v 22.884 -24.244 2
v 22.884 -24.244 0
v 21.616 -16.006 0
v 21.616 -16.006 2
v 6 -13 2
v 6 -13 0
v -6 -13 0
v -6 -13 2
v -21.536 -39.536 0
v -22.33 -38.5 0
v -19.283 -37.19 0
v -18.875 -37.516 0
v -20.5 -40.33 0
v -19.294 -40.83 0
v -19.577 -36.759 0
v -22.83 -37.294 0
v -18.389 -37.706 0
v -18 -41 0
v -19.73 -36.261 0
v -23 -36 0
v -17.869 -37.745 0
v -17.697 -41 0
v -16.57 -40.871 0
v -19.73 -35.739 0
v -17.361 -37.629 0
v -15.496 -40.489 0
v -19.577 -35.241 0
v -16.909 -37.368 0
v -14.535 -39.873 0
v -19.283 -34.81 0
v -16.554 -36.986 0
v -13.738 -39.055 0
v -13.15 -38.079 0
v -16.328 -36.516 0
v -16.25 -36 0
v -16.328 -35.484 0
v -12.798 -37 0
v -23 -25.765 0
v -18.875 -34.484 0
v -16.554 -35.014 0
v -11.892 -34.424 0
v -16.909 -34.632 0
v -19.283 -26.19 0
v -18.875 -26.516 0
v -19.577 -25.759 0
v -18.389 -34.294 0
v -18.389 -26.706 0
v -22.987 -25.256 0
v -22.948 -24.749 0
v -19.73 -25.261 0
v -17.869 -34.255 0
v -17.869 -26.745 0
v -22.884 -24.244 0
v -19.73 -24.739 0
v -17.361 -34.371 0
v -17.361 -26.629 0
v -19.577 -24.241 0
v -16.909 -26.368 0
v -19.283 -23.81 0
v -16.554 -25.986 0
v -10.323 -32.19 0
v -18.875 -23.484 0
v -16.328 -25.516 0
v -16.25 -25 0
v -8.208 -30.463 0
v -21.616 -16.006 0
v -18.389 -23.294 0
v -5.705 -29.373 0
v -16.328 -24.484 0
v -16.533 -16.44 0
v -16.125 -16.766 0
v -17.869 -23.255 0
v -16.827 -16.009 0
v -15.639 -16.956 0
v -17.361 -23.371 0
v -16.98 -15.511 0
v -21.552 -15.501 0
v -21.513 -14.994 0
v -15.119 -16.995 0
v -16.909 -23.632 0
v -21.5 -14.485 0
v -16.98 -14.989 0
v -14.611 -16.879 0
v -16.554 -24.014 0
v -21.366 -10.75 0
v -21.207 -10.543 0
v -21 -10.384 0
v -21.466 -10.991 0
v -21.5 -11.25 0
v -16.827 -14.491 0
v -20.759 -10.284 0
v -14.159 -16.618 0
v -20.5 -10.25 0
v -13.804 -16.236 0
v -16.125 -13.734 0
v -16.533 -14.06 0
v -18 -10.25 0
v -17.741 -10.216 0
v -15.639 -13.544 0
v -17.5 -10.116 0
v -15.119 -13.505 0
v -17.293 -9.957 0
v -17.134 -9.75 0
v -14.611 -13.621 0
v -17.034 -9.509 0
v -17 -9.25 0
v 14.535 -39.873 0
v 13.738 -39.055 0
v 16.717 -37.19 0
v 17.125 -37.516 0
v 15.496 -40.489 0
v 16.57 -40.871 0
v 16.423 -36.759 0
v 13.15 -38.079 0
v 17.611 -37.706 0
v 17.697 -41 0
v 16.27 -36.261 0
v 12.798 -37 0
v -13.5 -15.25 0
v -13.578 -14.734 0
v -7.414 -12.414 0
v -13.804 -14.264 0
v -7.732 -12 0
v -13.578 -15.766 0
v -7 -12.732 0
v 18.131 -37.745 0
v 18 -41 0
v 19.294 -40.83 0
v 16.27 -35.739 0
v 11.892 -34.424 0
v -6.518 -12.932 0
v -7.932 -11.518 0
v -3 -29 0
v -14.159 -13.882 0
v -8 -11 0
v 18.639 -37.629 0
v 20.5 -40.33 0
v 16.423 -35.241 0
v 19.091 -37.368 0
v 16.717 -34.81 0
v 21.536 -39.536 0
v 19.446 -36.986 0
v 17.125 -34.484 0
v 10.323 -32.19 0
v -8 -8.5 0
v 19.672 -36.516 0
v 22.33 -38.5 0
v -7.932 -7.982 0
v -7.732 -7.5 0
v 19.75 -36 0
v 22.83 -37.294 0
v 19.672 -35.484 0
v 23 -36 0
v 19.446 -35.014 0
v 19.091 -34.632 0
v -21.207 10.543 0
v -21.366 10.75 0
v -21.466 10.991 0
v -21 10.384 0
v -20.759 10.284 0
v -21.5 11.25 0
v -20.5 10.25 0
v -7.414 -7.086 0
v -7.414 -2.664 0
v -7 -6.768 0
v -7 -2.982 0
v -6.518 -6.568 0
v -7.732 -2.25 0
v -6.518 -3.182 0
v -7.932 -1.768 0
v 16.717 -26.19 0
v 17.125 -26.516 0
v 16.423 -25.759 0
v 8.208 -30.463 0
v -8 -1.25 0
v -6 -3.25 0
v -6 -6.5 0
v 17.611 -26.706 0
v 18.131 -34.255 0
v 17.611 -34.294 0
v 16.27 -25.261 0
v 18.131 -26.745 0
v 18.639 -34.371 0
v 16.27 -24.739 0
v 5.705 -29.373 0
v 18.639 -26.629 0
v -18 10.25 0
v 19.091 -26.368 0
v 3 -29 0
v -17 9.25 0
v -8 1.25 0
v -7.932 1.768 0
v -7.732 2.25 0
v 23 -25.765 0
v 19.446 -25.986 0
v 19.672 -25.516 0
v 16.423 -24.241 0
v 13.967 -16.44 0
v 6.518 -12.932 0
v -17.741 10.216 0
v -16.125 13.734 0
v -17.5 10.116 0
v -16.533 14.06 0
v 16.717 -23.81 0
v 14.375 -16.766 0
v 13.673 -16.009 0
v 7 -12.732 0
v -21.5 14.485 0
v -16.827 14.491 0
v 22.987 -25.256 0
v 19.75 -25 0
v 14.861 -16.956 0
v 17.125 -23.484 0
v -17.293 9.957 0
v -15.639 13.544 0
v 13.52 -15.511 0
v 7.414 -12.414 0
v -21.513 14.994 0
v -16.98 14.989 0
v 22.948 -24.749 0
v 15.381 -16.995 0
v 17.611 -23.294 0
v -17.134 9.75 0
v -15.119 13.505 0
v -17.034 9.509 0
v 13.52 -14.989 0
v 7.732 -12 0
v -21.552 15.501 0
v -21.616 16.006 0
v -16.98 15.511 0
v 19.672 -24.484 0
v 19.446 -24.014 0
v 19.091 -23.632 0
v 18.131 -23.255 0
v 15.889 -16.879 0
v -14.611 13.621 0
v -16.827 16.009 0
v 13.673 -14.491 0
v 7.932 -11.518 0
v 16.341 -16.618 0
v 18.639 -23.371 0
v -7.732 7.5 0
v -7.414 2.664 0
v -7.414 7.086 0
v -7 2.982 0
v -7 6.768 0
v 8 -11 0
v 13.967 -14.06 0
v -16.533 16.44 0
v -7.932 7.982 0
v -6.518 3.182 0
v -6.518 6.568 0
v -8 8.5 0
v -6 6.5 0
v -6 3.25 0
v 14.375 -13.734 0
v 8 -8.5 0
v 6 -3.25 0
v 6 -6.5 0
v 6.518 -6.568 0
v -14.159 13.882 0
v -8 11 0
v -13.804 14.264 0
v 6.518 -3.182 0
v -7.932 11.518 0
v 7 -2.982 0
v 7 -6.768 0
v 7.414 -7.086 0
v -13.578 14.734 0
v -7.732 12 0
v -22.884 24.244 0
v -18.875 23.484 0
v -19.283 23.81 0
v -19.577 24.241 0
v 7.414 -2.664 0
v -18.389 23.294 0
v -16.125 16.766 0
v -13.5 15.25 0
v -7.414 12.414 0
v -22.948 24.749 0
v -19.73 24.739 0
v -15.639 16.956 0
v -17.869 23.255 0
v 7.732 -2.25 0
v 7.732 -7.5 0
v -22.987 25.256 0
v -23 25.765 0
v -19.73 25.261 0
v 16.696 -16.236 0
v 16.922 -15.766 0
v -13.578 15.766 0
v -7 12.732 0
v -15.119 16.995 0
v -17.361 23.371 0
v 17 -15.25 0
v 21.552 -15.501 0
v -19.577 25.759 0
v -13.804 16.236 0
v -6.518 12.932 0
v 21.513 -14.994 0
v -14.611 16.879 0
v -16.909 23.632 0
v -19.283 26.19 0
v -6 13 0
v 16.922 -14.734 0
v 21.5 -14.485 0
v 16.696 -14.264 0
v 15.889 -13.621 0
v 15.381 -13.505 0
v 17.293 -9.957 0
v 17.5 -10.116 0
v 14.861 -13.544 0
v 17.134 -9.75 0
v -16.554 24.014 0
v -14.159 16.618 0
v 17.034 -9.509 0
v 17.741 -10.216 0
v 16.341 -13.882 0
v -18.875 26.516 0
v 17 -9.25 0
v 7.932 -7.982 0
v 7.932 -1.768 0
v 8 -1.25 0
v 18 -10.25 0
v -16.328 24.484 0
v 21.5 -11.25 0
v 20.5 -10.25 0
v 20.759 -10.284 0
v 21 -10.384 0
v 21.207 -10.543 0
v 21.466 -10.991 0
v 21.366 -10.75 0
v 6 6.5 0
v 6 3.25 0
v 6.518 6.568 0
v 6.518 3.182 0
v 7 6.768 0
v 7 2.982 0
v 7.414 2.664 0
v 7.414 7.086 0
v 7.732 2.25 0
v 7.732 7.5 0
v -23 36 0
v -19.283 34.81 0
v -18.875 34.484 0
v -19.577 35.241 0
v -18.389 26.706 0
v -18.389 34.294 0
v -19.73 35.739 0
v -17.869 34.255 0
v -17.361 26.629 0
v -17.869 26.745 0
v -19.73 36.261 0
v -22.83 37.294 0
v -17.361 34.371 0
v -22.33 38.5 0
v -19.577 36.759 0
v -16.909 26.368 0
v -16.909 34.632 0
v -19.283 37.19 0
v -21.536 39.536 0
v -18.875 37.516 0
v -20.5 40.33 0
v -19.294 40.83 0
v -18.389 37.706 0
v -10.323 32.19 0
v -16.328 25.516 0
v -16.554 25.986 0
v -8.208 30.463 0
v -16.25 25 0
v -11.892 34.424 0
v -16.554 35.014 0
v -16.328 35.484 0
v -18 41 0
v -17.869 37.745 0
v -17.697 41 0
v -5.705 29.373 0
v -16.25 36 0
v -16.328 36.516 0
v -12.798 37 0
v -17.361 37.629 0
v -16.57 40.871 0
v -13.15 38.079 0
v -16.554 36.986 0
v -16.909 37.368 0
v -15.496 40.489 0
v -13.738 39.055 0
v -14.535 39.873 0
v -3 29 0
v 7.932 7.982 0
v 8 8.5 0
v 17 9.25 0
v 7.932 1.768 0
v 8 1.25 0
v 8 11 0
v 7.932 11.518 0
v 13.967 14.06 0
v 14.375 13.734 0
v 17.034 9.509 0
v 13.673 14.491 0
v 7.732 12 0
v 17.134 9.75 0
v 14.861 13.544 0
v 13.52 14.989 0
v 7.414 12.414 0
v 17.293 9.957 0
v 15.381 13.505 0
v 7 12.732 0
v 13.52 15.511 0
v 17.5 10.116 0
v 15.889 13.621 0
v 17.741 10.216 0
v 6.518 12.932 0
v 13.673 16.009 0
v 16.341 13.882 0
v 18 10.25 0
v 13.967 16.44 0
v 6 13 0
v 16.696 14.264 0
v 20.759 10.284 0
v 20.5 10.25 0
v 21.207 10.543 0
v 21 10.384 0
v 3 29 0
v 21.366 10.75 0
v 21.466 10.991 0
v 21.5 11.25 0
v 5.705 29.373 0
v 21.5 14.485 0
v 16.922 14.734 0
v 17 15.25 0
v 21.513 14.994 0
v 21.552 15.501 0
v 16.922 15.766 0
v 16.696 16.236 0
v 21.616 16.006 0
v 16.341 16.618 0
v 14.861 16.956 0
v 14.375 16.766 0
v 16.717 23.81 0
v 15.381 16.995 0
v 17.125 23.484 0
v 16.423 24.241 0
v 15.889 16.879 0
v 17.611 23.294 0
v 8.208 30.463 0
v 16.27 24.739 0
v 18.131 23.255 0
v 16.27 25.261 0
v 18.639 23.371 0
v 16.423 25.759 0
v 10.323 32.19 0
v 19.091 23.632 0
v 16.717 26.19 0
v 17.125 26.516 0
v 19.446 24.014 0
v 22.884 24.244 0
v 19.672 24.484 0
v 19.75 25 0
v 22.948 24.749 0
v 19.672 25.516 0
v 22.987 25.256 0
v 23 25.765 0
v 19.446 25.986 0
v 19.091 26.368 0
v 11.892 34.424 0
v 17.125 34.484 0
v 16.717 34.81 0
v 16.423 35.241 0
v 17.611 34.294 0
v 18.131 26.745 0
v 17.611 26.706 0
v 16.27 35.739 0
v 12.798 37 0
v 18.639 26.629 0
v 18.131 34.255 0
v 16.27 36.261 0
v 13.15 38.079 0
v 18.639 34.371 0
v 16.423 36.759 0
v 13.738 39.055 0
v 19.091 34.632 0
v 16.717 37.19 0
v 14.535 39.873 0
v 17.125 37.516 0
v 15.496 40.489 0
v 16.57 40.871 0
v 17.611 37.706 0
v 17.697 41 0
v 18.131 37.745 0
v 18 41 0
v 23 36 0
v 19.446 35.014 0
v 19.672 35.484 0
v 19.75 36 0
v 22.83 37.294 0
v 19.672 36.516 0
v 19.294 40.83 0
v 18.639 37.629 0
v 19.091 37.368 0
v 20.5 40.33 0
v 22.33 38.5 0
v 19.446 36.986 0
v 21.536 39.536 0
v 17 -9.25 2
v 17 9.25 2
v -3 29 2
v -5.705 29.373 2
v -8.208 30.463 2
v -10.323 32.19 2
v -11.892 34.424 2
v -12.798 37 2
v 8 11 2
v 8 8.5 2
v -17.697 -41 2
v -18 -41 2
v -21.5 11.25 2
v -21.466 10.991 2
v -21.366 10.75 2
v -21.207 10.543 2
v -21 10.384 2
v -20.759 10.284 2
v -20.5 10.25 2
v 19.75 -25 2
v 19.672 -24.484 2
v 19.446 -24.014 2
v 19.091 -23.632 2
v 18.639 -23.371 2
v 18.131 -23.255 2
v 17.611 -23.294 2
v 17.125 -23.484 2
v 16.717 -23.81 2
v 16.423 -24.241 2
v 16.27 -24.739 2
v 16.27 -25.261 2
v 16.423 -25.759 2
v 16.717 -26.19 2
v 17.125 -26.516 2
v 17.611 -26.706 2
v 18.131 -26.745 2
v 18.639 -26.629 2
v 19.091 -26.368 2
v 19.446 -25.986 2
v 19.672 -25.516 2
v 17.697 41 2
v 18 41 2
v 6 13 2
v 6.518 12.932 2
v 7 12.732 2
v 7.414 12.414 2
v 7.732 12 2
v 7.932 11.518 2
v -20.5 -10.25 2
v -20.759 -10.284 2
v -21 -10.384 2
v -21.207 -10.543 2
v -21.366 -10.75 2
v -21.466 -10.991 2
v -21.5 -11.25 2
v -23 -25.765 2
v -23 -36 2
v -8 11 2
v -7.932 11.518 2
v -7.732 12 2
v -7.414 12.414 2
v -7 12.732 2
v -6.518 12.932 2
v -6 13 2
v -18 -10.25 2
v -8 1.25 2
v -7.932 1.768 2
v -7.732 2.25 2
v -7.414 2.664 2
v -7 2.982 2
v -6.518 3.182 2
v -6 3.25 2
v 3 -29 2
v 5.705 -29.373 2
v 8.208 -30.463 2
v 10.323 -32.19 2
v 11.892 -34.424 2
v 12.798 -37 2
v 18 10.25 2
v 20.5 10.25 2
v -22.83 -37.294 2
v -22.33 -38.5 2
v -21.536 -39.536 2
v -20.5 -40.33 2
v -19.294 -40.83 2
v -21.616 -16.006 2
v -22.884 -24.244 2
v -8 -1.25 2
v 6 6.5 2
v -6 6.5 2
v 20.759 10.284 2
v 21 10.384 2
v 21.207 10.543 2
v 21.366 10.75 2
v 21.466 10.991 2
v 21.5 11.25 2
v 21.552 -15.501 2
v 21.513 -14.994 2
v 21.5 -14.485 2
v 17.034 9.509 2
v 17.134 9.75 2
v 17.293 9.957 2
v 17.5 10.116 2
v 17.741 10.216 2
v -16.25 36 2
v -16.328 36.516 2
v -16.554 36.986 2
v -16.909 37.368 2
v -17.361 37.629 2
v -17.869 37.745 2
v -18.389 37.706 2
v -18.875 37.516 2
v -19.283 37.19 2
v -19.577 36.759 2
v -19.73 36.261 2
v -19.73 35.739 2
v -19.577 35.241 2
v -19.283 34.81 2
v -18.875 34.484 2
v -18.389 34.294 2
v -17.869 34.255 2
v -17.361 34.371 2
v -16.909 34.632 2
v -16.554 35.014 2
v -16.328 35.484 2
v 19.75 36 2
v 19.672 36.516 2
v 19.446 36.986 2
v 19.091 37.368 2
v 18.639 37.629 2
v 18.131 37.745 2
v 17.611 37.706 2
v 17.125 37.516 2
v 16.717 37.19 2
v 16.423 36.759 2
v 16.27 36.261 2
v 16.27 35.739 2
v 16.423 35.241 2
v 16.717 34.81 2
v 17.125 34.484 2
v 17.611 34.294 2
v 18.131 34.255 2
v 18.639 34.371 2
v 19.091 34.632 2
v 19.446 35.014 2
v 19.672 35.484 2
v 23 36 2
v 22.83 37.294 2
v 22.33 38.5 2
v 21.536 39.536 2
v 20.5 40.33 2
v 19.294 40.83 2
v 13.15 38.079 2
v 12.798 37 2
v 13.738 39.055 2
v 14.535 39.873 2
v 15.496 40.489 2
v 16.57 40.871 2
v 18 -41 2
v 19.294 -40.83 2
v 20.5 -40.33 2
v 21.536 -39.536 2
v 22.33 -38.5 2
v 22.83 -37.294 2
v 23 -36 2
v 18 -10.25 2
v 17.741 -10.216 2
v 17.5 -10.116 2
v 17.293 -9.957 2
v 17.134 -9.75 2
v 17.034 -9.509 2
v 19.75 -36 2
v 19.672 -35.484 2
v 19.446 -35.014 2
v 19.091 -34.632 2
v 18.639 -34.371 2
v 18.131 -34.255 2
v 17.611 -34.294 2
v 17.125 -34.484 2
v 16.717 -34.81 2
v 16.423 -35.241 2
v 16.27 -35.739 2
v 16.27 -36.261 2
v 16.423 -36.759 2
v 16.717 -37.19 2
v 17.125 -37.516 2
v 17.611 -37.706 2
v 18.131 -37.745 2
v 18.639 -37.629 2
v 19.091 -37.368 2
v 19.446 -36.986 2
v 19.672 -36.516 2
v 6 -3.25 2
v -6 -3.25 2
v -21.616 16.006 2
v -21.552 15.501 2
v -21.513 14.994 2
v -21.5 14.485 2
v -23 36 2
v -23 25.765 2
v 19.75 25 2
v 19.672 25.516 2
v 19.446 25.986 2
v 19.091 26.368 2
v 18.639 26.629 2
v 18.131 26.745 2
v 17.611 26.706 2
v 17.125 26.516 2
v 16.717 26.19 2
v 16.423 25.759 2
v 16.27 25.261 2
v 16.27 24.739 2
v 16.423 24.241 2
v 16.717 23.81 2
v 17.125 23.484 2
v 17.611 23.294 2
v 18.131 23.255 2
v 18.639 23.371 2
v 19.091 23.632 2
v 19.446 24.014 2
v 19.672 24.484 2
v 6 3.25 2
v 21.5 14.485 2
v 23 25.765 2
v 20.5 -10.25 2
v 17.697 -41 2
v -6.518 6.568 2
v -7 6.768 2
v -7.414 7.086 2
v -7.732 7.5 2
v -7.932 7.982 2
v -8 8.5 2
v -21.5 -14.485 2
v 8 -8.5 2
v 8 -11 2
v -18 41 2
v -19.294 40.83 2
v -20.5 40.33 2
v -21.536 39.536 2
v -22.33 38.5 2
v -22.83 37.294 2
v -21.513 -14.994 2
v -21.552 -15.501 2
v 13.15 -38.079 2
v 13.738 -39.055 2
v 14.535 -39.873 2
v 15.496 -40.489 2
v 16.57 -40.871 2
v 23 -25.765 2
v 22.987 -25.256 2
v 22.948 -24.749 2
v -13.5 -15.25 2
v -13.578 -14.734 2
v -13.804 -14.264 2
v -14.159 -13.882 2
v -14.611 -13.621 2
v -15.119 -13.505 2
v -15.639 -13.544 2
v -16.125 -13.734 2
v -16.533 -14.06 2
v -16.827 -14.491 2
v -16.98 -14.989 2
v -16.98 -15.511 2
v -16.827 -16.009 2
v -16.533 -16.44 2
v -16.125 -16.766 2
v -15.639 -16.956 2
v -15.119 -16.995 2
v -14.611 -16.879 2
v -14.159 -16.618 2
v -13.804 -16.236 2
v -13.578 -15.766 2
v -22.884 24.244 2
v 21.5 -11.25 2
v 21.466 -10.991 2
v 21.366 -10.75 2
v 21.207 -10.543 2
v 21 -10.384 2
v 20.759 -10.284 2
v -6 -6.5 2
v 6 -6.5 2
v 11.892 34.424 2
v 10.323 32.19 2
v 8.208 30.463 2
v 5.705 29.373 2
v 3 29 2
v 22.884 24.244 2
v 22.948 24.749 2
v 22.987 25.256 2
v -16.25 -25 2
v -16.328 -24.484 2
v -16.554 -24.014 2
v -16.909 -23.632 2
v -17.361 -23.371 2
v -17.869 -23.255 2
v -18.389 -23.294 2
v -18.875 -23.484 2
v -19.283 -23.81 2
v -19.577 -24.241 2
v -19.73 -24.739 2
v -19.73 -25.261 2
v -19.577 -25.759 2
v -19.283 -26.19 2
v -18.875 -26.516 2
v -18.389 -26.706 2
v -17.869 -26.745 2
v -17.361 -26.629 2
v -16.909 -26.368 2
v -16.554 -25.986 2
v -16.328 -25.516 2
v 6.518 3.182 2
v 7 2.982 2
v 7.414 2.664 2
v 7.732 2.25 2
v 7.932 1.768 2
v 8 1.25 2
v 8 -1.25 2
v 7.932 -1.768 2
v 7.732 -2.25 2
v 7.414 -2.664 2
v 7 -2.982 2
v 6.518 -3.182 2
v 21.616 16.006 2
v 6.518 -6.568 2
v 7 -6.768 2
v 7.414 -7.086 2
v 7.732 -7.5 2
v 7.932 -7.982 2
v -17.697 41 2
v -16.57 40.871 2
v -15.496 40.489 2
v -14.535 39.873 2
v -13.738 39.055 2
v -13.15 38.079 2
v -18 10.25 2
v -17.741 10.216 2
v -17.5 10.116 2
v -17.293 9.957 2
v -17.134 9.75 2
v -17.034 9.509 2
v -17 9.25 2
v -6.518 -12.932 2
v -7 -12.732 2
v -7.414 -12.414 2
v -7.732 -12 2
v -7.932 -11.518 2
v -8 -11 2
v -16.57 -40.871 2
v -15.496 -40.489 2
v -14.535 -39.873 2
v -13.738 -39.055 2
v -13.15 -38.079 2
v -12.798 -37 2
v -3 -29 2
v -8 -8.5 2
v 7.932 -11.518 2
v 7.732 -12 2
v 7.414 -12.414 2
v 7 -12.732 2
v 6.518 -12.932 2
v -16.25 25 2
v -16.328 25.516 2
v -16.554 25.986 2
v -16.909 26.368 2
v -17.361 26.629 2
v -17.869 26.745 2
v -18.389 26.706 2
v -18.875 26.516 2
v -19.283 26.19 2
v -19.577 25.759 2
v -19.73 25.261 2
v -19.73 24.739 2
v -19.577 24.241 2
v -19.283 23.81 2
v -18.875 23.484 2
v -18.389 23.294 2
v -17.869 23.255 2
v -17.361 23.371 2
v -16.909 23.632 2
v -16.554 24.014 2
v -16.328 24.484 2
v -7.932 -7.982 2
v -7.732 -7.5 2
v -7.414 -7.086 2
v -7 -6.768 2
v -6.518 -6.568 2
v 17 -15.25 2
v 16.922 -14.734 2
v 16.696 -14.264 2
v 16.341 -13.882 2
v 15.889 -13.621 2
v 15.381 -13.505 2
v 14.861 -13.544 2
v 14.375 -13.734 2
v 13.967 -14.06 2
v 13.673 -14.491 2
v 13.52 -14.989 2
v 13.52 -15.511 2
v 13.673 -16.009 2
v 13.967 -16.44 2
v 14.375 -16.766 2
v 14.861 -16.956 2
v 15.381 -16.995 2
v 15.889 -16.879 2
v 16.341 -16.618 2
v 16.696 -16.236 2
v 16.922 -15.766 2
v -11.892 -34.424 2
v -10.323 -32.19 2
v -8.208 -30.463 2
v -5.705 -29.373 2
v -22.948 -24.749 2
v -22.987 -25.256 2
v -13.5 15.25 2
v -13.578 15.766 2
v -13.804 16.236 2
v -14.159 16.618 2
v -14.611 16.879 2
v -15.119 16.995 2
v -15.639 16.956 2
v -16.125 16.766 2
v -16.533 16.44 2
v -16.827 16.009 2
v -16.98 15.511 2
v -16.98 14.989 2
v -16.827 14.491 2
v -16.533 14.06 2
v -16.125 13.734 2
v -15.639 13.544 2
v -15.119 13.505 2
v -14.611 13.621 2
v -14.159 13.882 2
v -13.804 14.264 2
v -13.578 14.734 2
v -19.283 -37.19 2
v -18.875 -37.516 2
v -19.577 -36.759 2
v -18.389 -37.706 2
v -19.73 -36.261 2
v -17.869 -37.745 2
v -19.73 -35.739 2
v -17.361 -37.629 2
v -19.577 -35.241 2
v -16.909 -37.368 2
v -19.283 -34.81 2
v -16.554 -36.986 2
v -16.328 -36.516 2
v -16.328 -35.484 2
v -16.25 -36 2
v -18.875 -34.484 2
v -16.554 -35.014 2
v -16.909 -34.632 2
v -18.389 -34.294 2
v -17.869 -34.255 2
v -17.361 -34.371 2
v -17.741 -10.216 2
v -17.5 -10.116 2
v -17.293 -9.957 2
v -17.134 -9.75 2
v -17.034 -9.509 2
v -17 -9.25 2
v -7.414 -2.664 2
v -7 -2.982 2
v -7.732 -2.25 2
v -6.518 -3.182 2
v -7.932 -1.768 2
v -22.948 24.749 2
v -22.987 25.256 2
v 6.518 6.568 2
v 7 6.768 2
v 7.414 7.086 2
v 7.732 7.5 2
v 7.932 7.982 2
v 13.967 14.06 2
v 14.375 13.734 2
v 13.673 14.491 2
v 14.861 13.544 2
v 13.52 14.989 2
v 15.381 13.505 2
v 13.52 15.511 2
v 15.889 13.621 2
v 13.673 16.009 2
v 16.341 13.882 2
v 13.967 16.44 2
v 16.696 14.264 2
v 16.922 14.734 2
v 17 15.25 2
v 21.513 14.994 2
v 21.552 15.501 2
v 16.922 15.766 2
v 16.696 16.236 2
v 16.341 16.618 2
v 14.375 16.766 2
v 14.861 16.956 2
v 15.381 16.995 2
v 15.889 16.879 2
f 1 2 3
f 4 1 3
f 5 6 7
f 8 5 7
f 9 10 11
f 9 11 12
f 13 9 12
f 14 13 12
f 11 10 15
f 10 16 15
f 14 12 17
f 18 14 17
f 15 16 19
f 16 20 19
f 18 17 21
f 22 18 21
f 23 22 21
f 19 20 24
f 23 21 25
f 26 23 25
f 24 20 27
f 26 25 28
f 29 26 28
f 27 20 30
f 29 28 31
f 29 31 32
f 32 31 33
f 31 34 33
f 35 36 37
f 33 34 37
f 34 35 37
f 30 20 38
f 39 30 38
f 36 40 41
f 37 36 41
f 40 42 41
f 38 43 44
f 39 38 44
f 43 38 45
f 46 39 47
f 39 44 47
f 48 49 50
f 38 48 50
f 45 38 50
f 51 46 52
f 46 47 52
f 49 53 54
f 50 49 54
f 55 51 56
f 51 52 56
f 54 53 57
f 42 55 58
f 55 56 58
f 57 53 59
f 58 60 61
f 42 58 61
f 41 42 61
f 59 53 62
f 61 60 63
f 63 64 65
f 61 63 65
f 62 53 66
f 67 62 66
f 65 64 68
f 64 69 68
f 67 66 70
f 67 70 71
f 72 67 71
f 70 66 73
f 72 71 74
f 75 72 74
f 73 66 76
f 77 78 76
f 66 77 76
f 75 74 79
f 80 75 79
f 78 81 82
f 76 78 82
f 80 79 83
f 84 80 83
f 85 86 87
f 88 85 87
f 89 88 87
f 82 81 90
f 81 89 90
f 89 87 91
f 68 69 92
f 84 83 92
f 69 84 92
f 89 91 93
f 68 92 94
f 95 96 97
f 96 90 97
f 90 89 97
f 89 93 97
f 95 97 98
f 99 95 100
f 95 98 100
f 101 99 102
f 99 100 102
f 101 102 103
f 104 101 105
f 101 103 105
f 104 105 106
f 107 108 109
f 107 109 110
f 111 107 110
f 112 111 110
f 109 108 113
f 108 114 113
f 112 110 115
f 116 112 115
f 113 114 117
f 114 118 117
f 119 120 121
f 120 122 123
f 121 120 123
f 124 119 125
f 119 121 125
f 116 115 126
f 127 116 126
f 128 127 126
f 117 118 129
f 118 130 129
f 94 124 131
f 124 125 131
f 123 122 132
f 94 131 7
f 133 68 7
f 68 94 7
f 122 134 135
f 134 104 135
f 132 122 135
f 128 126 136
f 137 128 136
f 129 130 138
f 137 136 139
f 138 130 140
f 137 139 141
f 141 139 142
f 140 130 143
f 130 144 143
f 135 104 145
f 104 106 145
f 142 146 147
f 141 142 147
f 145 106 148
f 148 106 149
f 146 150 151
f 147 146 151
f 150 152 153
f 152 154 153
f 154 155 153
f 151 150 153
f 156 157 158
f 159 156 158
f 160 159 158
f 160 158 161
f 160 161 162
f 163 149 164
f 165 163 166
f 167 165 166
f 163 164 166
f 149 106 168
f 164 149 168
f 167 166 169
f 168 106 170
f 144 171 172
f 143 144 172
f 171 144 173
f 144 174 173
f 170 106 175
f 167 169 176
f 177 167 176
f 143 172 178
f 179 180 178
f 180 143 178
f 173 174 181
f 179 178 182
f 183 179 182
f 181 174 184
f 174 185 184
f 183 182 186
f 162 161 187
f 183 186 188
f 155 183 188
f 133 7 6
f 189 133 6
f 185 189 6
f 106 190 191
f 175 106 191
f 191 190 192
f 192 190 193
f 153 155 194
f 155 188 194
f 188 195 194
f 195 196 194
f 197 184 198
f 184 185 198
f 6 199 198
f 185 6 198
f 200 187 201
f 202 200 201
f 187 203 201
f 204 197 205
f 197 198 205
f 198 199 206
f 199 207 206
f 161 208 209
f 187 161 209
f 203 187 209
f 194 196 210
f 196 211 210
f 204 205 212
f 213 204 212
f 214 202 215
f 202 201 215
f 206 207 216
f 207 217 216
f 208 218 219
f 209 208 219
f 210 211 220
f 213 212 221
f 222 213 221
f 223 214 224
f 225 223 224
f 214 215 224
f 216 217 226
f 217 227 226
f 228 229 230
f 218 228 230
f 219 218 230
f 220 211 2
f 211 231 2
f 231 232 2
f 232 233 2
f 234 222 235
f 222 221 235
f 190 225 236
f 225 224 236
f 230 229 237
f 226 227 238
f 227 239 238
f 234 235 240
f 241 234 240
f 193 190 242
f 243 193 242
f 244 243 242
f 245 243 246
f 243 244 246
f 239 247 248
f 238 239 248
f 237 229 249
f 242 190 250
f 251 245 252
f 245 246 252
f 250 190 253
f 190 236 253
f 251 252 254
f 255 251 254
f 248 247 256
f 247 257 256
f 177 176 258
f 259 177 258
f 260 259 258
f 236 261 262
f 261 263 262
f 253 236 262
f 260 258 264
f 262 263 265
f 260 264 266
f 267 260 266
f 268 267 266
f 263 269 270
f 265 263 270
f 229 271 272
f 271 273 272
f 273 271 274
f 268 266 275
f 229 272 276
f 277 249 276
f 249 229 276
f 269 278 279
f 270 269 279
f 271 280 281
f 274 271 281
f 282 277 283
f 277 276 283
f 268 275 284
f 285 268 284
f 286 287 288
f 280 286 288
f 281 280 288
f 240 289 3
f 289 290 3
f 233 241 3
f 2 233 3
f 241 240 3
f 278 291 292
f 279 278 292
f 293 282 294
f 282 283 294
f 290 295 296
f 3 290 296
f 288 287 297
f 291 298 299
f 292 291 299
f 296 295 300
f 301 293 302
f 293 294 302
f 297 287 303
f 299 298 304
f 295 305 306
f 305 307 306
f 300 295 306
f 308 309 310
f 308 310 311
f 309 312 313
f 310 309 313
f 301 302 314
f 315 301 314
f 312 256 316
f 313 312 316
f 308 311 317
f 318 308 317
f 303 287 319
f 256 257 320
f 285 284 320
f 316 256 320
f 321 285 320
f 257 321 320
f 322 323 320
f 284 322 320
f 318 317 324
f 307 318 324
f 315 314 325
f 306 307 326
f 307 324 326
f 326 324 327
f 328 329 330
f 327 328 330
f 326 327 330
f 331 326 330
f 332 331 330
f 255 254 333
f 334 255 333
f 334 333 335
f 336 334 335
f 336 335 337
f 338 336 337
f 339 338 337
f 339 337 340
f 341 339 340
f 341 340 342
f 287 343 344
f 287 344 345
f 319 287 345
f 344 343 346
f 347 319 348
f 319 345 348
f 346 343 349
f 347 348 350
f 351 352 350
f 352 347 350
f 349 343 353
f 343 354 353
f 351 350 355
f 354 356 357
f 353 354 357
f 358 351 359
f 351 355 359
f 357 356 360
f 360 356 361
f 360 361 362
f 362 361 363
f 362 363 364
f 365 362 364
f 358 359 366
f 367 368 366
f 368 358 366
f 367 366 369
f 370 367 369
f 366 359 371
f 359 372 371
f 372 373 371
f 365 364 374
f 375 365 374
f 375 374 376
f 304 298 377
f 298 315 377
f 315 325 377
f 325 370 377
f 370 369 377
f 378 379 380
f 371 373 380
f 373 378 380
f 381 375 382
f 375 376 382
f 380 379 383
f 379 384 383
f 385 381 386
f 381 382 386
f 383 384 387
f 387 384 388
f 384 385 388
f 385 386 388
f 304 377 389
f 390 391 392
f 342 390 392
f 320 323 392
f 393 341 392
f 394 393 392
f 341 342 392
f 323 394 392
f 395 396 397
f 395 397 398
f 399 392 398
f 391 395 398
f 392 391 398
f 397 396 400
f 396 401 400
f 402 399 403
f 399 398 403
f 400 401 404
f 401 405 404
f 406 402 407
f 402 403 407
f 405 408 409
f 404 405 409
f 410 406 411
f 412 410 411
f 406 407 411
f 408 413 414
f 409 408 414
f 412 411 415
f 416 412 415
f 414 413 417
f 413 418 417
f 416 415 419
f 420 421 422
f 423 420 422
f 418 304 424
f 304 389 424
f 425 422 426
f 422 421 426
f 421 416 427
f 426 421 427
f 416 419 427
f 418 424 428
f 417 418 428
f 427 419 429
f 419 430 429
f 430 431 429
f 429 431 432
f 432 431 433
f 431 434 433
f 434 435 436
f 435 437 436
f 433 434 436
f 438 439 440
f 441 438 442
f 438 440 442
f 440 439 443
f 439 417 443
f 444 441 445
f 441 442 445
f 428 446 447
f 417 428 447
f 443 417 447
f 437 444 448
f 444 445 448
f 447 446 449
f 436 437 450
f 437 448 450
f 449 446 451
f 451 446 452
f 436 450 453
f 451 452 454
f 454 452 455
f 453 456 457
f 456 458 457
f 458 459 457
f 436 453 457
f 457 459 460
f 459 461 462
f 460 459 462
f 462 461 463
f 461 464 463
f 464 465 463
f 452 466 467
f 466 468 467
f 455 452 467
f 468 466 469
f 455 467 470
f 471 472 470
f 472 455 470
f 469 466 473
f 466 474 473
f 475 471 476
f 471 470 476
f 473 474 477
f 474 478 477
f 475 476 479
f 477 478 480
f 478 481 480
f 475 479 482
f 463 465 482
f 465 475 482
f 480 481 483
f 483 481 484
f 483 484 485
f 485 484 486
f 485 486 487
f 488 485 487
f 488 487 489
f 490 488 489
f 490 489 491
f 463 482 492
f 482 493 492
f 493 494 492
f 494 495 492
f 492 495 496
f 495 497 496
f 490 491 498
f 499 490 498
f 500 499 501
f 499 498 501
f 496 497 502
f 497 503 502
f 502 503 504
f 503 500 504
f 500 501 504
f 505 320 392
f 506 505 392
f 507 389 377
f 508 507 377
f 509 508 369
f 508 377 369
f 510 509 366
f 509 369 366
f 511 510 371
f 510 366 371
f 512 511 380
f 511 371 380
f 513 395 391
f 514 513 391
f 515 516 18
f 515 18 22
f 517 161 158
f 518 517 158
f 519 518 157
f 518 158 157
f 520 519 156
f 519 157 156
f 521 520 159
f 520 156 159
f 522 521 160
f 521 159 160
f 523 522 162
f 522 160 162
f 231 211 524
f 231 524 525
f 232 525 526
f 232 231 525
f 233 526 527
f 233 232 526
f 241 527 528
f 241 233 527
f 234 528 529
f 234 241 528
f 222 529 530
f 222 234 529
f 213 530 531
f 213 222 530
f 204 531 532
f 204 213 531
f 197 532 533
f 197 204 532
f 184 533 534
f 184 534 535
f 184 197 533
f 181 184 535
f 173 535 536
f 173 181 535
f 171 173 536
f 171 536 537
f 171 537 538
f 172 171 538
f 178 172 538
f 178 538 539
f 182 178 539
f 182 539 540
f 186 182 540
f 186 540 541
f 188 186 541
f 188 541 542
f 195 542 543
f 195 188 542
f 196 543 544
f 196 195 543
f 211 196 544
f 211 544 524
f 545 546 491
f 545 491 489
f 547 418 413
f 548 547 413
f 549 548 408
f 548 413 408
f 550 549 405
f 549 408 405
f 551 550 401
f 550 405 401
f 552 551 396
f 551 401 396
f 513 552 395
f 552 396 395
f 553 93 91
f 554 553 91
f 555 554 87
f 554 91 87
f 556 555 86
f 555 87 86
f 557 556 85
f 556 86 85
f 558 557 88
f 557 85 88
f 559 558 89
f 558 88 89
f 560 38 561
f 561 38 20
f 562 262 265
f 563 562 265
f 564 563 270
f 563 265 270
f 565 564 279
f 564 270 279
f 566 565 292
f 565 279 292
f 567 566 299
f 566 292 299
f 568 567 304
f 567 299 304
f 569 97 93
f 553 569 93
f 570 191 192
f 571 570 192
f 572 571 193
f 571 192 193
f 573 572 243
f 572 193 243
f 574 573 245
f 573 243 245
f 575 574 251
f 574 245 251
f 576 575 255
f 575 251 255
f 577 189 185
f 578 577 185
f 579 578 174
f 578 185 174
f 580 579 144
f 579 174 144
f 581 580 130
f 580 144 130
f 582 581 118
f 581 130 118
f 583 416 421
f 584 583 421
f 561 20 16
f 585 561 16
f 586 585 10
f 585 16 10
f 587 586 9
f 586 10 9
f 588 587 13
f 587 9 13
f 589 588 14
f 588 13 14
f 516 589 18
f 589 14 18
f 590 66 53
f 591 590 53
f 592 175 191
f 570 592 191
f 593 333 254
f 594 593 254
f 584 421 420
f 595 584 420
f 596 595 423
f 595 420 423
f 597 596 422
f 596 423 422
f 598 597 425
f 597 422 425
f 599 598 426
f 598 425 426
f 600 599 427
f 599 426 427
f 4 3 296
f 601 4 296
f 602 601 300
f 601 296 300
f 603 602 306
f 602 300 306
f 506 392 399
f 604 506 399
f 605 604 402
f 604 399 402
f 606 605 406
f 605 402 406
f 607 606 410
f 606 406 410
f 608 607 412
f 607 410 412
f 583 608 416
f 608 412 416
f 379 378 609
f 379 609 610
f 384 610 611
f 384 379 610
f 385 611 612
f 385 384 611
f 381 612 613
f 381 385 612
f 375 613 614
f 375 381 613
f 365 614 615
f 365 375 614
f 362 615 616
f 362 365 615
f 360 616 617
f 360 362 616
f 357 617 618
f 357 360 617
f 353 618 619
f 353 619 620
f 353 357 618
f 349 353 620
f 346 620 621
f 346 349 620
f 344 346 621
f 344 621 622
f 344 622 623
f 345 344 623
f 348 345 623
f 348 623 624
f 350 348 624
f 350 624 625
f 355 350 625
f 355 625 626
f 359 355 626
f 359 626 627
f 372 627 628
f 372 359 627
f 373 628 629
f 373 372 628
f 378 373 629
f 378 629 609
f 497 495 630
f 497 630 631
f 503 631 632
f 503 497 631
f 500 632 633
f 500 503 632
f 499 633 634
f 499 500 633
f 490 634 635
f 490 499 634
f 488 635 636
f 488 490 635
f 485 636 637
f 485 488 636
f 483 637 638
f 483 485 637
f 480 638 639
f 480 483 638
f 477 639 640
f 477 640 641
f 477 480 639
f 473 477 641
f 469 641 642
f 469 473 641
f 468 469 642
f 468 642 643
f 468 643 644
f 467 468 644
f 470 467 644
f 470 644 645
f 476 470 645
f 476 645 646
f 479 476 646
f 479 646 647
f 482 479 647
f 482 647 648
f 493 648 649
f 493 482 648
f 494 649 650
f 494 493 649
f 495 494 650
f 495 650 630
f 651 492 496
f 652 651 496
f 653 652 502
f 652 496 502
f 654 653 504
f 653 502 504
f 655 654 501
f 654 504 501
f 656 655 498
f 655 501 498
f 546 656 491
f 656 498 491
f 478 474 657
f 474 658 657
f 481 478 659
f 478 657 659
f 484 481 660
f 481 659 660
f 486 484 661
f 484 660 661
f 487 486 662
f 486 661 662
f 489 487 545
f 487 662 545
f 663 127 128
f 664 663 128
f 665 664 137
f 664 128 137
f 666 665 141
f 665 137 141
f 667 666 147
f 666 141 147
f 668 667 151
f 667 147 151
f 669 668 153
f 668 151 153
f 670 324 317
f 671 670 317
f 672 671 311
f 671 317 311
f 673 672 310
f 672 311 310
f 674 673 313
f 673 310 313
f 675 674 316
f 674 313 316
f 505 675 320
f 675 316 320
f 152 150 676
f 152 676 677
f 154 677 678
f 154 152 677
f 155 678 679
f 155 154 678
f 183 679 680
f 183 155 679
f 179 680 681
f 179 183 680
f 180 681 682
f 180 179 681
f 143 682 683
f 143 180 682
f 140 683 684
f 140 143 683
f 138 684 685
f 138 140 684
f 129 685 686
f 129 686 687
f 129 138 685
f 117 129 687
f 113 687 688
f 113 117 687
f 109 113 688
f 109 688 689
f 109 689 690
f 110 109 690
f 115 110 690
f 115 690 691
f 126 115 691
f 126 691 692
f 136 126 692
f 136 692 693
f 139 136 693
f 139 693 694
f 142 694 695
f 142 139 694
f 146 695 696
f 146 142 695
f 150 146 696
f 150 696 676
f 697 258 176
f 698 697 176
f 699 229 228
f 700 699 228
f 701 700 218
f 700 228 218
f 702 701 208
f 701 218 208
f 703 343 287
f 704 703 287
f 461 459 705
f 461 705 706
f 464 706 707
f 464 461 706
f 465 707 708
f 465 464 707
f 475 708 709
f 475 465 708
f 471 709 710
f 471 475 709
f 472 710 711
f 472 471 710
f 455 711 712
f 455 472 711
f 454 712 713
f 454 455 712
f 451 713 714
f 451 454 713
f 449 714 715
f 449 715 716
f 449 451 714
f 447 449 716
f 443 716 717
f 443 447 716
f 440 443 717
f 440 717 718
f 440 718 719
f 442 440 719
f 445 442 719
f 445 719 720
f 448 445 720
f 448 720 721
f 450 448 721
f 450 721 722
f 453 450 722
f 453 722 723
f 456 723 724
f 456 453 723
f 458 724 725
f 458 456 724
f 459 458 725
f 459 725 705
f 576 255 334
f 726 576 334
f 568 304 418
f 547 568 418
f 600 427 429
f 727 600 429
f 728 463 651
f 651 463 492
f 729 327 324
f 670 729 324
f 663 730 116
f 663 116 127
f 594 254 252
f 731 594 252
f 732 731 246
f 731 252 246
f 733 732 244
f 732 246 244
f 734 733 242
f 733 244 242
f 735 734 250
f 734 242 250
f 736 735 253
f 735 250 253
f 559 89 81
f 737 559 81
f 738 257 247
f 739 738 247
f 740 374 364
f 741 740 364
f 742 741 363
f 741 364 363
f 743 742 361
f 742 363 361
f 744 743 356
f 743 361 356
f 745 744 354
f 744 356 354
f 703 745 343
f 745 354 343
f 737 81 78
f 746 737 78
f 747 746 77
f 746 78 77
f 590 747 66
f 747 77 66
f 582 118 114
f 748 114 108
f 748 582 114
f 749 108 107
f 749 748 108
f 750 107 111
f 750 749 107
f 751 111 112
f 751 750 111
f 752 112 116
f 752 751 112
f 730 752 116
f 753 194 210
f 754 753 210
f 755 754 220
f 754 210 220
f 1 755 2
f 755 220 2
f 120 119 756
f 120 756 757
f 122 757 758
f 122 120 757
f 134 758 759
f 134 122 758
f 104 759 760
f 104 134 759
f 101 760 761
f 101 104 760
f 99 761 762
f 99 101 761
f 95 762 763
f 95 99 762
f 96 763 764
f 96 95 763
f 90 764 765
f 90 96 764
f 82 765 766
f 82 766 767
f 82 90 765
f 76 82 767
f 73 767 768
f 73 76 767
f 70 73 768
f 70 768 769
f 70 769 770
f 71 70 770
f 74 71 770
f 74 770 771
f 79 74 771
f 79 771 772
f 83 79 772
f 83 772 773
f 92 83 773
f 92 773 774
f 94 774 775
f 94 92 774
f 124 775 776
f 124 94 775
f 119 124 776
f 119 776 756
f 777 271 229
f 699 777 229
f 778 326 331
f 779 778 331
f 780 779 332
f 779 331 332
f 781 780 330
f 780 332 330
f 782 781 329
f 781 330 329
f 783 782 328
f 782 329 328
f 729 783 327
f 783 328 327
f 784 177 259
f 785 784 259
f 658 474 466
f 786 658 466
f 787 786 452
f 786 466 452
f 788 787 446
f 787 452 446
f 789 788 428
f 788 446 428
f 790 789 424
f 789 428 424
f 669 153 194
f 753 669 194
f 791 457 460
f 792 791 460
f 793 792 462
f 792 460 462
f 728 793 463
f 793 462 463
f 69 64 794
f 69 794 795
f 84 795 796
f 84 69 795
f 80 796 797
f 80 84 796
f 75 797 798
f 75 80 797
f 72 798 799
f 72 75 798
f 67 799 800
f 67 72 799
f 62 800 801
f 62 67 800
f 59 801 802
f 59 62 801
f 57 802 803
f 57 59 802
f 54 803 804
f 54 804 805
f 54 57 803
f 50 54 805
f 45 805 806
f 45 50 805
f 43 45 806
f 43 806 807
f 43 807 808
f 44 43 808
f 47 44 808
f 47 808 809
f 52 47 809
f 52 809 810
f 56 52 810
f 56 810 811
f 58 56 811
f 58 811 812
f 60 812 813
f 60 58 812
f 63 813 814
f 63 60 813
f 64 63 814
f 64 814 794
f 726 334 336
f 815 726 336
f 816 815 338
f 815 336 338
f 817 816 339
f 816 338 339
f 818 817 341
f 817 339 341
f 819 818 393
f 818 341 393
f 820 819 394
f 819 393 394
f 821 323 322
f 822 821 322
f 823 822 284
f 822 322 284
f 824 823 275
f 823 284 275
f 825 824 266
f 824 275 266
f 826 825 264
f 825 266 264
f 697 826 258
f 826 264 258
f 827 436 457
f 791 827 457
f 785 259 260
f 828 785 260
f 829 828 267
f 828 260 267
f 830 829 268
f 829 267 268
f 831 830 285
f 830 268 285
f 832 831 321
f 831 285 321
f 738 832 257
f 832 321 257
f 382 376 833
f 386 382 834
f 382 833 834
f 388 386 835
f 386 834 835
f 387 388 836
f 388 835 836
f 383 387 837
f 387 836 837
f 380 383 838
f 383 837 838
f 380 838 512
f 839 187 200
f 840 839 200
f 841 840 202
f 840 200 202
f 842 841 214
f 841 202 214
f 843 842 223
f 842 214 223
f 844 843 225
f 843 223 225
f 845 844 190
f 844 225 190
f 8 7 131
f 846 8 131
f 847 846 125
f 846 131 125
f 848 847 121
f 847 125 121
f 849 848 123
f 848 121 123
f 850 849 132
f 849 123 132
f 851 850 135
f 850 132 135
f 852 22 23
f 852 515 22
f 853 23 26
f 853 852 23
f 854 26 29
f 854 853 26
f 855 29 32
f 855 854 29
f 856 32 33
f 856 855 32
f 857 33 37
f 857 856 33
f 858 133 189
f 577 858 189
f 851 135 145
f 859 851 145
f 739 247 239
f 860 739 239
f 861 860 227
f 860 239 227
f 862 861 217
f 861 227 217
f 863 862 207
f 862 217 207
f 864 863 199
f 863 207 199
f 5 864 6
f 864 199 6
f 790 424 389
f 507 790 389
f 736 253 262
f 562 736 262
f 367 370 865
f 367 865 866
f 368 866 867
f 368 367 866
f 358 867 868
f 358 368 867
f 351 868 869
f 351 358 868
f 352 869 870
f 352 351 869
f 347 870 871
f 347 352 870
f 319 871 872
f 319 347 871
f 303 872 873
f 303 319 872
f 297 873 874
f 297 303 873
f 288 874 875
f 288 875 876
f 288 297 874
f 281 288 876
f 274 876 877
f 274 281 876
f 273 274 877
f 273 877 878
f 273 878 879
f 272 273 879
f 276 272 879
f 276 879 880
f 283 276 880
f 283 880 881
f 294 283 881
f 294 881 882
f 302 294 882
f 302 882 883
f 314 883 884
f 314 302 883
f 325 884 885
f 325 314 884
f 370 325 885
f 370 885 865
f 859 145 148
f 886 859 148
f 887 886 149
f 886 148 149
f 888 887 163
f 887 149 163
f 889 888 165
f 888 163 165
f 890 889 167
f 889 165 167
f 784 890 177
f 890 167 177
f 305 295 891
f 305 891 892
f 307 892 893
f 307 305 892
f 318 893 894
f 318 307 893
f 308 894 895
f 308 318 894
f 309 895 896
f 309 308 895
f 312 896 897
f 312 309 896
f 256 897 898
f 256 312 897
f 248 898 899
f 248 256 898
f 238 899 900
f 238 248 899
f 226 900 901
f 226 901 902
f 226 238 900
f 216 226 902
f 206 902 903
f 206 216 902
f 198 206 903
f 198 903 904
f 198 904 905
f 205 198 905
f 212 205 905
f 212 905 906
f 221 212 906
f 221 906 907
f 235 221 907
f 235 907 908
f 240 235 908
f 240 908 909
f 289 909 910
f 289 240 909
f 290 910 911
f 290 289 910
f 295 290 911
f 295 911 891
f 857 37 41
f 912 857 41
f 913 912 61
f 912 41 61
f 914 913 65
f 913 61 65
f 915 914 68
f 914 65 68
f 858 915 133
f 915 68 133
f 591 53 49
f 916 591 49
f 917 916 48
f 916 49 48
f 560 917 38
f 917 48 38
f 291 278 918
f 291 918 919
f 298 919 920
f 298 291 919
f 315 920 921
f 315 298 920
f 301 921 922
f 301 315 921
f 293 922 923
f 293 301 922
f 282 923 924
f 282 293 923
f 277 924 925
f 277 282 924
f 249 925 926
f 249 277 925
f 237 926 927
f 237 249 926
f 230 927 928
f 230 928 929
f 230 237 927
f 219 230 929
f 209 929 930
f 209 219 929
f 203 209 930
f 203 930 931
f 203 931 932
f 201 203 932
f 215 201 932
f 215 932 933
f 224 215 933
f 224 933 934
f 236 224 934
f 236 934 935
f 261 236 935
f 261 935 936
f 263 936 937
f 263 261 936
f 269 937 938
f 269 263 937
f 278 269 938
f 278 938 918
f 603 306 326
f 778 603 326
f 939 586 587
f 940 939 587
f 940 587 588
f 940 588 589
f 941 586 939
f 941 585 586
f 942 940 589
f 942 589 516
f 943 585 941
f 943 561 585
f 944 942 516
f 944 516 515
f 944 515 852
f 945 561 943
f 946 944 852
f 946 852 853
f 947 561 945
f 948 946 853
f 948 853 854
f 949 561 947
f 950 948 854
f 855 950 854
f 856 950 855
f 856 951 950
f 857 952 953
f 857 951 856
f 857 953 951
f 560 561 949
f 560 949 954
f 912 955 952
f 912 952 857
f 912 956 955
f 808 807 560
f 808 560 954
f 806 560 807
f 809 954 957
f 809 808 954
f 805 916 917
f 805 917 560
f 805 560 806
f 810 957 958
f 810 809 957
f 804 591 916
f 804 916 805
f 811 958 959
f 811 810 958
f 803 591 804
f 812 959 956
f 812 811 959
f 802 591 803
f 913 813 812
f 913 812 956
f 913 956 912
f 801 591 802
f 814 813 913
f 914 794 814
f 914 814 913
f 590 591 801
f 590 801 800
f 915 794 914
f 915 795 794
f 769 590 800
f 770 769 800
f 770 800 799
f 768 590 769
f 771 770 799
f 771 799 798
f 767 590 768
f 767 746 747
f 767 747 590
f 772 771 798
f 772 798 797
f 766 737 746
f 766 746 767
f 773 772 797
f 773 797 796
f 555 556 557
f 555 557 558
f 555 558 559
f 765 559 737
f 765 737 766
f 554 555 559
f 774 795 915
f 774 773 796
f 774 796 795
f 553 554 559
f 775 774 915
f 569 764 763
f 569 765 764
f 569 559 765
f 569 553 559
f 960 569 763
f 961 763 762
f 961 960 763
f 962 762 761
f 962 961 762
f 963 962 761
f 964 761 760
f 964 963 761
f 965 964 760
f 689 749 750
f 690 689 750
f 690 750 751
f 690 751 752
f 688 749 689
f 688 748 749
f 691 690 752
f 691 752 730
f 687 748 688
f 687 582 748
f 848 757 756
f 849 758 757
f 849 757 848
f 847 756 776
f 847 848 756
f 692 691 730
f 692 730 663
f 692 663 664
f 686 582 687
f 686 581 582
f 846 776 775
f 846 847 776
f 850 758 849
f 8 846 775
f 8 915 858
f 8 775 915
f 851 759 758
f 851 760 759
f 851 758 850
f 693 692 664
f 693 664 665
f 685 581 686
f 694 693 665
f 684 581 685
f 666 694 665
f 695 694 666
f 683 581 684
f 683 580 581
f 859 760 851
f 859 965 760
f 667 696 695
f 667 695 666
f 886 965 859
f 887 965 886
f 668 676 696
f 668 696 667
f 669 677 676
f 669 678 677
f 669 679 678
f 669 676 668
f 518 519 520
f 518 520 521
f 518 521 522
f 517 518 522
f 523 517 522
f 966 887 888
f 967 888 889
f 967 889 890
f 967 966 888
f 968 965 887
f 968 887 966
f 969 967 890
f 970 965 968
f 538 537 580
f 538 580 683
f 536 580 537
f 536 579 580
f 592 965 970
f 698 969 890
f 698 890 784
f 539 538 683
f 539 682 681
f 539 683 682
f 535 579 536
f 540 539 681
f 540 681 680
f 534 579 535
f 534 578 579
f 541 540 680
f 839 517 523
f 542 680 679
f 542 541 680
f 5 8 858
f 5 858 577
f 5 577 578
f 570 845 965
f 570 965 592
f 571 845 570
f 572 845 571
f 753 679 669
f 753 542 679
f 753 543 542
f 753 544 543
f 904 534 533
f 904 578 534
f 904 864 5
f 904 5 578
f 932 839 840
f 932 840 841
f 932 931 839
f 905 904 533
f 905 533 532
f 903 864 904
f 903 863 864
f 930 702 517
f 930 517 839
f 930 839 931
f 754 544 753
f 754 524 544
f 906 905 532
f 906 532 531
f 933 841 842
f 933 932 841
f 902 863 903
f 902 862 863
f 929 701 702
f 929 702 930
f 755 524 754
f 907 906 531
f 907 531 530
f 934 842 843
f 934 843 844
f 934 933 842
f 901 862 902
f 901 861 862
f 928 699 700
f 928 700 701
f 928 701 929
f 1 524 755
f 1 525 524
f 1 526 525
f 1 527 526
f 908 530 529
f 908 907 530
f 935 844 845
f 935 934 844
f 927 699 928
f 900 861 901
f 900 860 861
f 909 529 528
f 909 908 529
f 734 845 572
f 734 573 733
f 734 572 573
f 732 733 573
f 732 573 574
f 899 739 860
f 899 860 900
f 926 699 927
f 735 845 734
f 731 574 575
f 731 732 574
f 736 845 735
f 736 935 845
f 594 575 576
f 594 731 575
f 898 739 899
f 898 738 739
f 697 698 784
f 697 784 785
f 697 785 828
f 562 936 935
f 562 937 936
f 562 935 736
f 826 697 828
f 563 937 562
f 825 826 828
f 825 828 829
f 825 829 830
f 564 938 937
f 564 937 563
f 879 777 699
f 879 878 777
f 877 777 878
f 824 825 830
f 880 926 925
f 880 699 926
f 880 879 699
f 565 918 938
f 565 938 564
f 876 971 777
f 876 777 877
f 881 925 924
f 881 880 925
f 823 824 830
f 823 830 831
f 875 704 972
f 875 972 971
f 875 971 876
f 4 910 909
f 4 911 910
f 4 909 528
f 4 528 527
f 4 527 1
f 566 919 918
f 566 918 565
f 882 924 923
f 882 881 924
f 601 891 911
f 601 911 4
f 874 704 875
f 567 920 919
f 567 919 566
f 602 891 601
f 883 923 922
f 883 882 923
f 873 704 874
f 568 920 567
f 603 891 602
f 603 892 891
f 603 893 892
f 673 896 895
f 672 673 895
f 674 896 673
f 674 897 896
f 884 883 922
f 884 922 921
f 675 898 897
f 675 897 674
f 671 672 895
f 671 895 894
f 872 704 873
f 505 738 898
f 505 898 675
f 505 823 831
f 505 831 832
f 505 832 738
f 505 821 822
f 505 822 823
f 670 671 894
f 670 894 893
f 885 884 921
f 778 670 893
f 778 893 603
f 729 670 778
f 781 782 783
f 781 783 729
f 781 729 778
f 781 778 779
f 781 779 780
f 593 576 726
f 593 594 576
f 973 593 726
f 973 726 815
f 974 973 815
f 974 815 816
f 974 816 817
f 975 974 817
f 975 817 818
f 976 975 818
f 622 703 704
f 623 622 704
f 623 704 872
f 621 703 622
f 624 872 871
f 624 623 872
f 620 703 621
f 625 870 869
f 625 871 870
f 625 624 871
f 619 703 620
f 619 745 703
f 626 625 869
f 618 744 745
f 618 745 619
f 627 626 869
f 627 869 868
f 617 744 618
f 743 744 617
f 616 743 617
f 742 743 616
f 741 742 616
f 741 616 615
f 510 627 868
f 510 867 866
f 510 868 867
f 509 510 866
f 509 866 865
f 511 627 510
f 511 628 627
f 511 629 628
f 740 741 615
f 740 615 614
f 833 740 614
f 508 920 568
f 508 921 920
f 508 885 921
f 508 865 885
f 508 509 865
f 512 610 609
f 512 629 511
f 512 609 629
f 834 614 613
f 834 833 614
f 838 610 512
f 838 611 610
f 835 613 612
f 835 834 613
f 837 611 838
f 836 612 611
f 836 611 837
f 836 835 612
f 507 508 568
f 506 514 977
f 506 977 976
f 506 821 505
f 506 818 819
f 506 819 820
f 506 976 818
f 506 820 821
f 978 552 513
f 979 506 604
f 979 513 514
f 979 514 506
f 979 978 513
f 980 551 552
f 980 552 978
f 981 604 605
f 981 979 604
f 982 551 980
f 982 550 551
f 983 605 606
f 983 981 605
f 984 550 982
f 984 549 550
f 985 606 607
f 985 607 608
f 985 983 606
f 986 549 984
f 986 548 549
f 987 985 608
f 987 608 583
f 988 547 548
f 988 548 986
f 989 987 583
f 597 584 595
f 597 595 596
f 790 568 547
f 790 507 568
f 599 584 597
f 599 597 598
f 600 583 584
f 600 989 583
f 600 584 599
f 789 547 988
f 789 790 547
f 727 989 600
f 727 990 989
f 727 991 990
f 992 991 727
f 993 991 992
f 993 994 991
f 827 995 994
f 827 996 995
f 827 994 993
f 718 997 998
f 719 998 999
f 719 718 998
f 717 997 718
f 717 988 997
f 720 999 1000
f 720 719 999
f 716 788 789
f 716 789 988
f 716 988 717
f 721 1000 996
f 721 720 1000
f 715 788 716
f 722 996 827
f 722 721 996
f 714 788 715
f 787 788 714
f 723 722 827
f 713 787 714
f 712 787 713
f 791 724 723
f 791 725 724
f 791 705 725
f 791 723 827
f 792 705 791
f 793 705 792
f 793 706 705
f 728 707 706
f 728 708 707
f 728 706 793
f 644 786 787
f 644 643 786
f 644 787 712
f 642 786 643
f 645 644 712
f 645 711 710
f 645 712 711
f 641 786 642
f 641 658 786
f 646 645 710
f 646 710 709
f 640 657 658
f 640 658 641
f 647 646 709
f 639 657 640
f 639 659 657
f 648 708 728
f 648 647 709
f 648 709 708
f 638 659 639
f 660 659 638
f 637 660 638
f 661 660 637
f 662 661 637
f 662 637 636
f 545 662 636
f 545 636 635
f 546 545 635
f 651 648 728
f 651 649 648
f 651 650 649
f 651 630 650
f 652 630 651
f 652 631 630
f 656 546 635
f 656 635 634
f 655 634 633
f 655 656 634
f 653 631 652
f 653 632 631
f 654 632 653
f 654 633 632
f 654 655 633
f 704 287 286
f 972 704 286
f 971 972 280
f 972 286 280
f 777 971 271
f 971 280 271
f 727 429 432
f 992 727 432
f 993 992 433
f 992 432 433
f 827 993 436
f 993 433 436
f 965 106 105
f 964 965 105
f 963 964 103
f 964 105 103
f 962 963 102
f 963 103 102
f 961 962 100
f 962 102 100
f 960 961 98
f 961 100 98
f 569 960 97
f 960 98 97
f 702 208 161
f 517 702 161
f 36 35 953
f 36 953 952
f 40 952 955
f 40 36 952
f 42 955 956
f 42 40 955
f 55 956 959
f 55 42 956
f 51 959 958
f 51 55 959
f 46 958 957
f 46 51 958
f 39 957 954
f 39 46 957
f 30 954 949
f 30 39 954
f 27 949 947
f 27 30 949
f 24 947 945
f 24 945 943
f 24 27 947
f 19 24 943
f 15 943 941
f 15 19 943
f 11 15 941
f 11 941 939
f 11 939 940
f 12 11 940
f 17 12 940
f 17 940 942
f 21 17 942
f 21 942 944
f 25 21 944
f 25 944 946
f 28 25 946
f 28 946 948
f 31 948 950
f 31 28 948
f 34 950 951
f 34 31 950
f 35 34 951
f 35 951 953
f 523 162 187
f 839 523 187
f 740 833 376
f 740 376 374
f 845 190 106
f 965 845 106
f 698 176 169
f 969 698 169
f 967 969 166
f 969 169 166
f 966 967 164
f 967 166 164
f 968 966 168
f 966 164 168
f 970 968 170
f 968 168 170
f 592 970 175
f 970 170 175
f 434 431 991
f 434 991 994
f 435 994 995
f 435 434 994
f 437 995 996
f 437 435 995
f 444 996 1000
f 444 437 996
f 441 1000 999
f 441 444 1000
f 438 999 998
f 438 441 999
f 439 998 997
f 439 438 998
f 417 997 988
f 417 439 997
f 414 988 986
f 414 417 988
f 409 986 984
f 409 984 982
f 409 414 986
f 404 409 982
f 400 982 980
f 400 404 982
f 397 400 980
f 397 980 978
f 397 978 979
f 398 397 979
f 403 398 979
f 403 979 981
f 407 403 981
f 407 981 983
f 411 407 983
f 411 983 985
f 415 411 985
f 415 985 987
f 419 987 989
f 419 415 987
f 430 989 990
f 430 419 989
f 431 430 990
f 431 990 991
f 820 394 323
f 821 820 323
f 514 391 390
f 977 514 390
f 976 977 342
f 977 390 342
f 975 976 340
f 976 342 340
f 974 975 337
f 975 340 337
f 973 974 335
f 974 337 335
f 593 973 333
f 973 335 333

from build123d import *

# Parameters (mm, degrees)
F0_R     = 1.75
F1_DEPTH = 2
F2_R     = 5


with BuildPart() as f1:
    # F0 (on Top) → F1 (new body)
    with BuildSketch(Plane.XY):
        with BuildLine():
            Line((-13, 41), (-18, 41))
            ThreePointArc((-18, 41), (-21.5355339059, 39.5355339059), (-23, 36))
            Line((-23, 36), (-23, 25.7647321898))
            ThreePointArc((-23, 25.7647321898), (-22.9708868654, 25.0022263751), (-22.8837169765, 24.2441603473))
            Line((-22.8837169765, 24.2441603473), (-21.6162830235, 16.0058396527))
            ThreePointArc((-21.6162830235, 16.0058396527), (-21.5291131346, 15.2477736249), (-21.5, 14.4852678102))
            Line((-21.5, 14.4852678102), (-21.5, 11.25))
            ThreePointArc((-21.5, 11.25), (-21.2071067812, 10.5428932188), (-20.5, 10.25))
            Line((-20.5, 10.25), (-18, 10.25))
            ThreePointArc((-18, 10.25), (-17.2928932188, 9.9571067812), (-17, 9.25))
            Line((-17, 9.25), (-17, -9.25))
            ThreePointArc((-17, -9.25), (-17.2928932188, -9.9571067812), (-18, -10.25))
            Line((-18, -10.25), (-20.5, -10.25))
            ThreePointArc((-20.5, -10.25), (-21.2071067812, -10.5428932188), (-21.5, -11.25))
            Line((-21.5, -11.25), (-21.5, -14.4852678102))
            ThreePointArc((-21.5, -14.4852678102), (-21.5291131346, -15.2477736249), (-21.6162830235, -16.0058396527))
            Line((-21.6162830235, -16.0058396527), (-22.8837169765, -24.2441603473))
            ThreePointArc((-22.8837169765, -24.2441603473), (-22.9708868654, -25.0022263751), (-23, -25.7647321898))
            Line((-23, -25.7647321898), (-23, -36))
            ThreePointArc((-23, -36), (-21.5355339059, -39.5355339059), (-18, -41))
            Line((-18, -41), (-13, -41))
            Line((-13, -41), (-13, -39))
            ThreePointArc((-13, -39), (-10.0710678119, -31.9289321881), (-3, -29))
            Line((-3, -29), (0, -29))
            Line((0, -29), (3, -29))
            ThreePointArc((3, -29), (10.0710678119, -31.9289321881), (13, -39))
            Line((13, -39), (13, -41))
            Line((13, -41), (18, -41))
            ThreePointArc((18, -41), (21.5355339059, -39.5355339059), (23, -36))
            Line((23, -36), (23, -25.7647321898))
            ThreePointArc((23, -25.7647321898), (22.9708868654, -25.0022263751), (22.8837169765, -24.2441603473))
            Line((22.8837169765, -24.2441603473), (21.6162830235, -16.0058396527))
            ThreePointArc((21.6162830235, -16.0058396527), (21.5291131346, -15.2477736249), (21.5, -14.4852678102))
            Line((21.5, -14.4852678102), (21.5, -11.25))
            ThreePointArc((21.5, -11.25), (21.2071067812, -10.5428932188), (20.5, -10.25))
            Line((20.5, -10.25), (18, -10.25))
            ThreePointArc((18, -10.25), (17.2928932188, -9.9571067812), (17, -9.25))
            Line((17, -9.25), (17, 9.25))
            ThreePointArc((17, 9.25), (17.2928932188, 9.9571067812), (18, 10.25))
            Line((18, 10.25), (20.5, 10.25))
            ThreePointArc((20.5, 10.25), (21.2071067812, 10.5428932188), (21.5, 11.25))
            Line((21.5, 11.25), (21.5, 14.4852678102))
            ThreePointArc((21.5, 14.4852678102), (21.5291131346, 15.2477736249), (21.6162830235, 16.0058396527))
            Line((21.6162830235, 16.0058396527), (22.8837169765, 24.2441603473))
            ThreePointArc((22.8837169765, 24.2441603473), (22.9708868654, 25.0022263751), (23, 25.7647321898))
            Line((23, 25.7647321898), (23, 36))
            ThreePointArc((23, 36), (21.5355339059, 39.5355339059), (18, 41))
            Line((18, 41), (13, 41))
            Line((13, 41), (13, 39))
            ThreePointArc((13, 39), (10.0710678119, 31.9289321881), (3, 29))
            Line((3, 29), (0, 29))
            Line((0, 29), (-3, 29))
            ThreePointArc((-3, 29), (-10.0710678119, 31.9289321881), (-13, 39))
            Line((-13, 39), (-13, 41))
        make_face()
        with Locations((-18, -36)):
            Circle(F0_R, mode=Mode.SUBTRACT)
        with Locations((-18, -25)):
            Circle(F0_R, mode=Mode.SUBTRACT)
        with Locations((-15.25, -15.25)):
            Circle(F0_R, mode=Mode.SUBTRACT)
        with Locations((18, -36)):
            Circle(F0_R, mode=Mode.SUBTRACT)
        with Locations((18, -25)):
            Circle(F0_R, mode=Mode.SUBTRACT)
        with BuildLine():
            Line((6, -13), (-6, -13))
            ThreePointArc((-6, -13), (-7.4142135624, -12.4142135624), (-8, -11))
            Line((-8, -11), (-8, -8.5))
            ThreePointArc((-8, -8.5), (-7.4142135624, -7.0857864376), (-6, -6.5))
            Line((-6, -6.5), (6, -6.5))
            ThreePointArc((6, -6.5), (7.4142135624, -7.0857864376), (8, -8.5))
            Line((8, -8.5), (8, -11))
            ThreePointArc((8, -11), (7.4142135624, -12.4142135624), (6, -13))
        make_face(mode=Mode.SUBTRACT)
        with Locations((15.25, -15.25)):
            Circle(F0_R, mode=Mode.SUBTRACT)
        with Locations((-15.25, 15.25)):
            Circle(F0_R, mode=Mode.SUBTRACT)
        with Locations((-18, 25)):
            Circle(F0_R, mode=Mode.SUBTRACT)
        with Locations((-18, 36)):
            Circle(F0_R, mode=Mode.SUBTRACT)
        with BuildLine():
            ThreePointArc((-8, 1.25), (-7.4142135624, 2.6642135624), (-6, 3.25))
            Line((-6, 3.25), (6, 3.25))
            ThreePointArc((6, 3.25), (7.4142135624, 2.6642135624), (8, 1.25))
            Line((8, 1.25), (8, -1.25))
            ThreePointArc((8, -1.25), (7.4142135624, -2.6642135624), (6, -3.25))
            Line((6, -3.25), (-6, -3.25))
            ThreePointArc((-6, -3.25), (-7.4142135624, -2.6642135624), (-8, -1.25))
            Line((-8, -1.25), (-8, 1.25))
        make_face(mode=Mode.SUBTRACT)
        with BuildLine():
            ThreePointArc((-8, 11), (-7.4142135624, 12.4142135624), (-6, 13))
            Line((-6, 13), (6, 13))
            ThreePointArc((6, 13), (7.4142135624, 12.4142135624), (8, 11))
            Line((8, 11), (8, 8.5))
            ThreePointArc((8, 8.5), (7.4142135624, 7.0857864376), (6, 6.5))
            Line((6, 6.5), (-6, 6.5))
            ThreePointArc((-6, 6.5), (-7.4142135624, 7.0857864376), (-8, 8.5))
            Line((-8, 8.5), (-8, 11))
        make_face(mode=Mode.SUBTRACT)
        with Locations((15.25, 15.25)):
            Circle(F0_R, mode=Mode.SUBTRACT)
        with Locations((18, 25)):
            Circle(F0_R, mode=Mode.SUBTRACT)
        with Locations((18, 36)):
            Circle(F0_R, mode=Mode.SUBTRACT)
    extrude(amount=F1_DEPTH)

    # F2
    f2_edges = [f1.edges().sort_by_distance(p)[0] for p in [
        (-13, -41, 1),
        (13, -41, 1),
        (-13, 41, 1),
        (13, 41, 1),
    ]]
    fillet(f2_edges, radius=F2_R)


solid = f1.part
